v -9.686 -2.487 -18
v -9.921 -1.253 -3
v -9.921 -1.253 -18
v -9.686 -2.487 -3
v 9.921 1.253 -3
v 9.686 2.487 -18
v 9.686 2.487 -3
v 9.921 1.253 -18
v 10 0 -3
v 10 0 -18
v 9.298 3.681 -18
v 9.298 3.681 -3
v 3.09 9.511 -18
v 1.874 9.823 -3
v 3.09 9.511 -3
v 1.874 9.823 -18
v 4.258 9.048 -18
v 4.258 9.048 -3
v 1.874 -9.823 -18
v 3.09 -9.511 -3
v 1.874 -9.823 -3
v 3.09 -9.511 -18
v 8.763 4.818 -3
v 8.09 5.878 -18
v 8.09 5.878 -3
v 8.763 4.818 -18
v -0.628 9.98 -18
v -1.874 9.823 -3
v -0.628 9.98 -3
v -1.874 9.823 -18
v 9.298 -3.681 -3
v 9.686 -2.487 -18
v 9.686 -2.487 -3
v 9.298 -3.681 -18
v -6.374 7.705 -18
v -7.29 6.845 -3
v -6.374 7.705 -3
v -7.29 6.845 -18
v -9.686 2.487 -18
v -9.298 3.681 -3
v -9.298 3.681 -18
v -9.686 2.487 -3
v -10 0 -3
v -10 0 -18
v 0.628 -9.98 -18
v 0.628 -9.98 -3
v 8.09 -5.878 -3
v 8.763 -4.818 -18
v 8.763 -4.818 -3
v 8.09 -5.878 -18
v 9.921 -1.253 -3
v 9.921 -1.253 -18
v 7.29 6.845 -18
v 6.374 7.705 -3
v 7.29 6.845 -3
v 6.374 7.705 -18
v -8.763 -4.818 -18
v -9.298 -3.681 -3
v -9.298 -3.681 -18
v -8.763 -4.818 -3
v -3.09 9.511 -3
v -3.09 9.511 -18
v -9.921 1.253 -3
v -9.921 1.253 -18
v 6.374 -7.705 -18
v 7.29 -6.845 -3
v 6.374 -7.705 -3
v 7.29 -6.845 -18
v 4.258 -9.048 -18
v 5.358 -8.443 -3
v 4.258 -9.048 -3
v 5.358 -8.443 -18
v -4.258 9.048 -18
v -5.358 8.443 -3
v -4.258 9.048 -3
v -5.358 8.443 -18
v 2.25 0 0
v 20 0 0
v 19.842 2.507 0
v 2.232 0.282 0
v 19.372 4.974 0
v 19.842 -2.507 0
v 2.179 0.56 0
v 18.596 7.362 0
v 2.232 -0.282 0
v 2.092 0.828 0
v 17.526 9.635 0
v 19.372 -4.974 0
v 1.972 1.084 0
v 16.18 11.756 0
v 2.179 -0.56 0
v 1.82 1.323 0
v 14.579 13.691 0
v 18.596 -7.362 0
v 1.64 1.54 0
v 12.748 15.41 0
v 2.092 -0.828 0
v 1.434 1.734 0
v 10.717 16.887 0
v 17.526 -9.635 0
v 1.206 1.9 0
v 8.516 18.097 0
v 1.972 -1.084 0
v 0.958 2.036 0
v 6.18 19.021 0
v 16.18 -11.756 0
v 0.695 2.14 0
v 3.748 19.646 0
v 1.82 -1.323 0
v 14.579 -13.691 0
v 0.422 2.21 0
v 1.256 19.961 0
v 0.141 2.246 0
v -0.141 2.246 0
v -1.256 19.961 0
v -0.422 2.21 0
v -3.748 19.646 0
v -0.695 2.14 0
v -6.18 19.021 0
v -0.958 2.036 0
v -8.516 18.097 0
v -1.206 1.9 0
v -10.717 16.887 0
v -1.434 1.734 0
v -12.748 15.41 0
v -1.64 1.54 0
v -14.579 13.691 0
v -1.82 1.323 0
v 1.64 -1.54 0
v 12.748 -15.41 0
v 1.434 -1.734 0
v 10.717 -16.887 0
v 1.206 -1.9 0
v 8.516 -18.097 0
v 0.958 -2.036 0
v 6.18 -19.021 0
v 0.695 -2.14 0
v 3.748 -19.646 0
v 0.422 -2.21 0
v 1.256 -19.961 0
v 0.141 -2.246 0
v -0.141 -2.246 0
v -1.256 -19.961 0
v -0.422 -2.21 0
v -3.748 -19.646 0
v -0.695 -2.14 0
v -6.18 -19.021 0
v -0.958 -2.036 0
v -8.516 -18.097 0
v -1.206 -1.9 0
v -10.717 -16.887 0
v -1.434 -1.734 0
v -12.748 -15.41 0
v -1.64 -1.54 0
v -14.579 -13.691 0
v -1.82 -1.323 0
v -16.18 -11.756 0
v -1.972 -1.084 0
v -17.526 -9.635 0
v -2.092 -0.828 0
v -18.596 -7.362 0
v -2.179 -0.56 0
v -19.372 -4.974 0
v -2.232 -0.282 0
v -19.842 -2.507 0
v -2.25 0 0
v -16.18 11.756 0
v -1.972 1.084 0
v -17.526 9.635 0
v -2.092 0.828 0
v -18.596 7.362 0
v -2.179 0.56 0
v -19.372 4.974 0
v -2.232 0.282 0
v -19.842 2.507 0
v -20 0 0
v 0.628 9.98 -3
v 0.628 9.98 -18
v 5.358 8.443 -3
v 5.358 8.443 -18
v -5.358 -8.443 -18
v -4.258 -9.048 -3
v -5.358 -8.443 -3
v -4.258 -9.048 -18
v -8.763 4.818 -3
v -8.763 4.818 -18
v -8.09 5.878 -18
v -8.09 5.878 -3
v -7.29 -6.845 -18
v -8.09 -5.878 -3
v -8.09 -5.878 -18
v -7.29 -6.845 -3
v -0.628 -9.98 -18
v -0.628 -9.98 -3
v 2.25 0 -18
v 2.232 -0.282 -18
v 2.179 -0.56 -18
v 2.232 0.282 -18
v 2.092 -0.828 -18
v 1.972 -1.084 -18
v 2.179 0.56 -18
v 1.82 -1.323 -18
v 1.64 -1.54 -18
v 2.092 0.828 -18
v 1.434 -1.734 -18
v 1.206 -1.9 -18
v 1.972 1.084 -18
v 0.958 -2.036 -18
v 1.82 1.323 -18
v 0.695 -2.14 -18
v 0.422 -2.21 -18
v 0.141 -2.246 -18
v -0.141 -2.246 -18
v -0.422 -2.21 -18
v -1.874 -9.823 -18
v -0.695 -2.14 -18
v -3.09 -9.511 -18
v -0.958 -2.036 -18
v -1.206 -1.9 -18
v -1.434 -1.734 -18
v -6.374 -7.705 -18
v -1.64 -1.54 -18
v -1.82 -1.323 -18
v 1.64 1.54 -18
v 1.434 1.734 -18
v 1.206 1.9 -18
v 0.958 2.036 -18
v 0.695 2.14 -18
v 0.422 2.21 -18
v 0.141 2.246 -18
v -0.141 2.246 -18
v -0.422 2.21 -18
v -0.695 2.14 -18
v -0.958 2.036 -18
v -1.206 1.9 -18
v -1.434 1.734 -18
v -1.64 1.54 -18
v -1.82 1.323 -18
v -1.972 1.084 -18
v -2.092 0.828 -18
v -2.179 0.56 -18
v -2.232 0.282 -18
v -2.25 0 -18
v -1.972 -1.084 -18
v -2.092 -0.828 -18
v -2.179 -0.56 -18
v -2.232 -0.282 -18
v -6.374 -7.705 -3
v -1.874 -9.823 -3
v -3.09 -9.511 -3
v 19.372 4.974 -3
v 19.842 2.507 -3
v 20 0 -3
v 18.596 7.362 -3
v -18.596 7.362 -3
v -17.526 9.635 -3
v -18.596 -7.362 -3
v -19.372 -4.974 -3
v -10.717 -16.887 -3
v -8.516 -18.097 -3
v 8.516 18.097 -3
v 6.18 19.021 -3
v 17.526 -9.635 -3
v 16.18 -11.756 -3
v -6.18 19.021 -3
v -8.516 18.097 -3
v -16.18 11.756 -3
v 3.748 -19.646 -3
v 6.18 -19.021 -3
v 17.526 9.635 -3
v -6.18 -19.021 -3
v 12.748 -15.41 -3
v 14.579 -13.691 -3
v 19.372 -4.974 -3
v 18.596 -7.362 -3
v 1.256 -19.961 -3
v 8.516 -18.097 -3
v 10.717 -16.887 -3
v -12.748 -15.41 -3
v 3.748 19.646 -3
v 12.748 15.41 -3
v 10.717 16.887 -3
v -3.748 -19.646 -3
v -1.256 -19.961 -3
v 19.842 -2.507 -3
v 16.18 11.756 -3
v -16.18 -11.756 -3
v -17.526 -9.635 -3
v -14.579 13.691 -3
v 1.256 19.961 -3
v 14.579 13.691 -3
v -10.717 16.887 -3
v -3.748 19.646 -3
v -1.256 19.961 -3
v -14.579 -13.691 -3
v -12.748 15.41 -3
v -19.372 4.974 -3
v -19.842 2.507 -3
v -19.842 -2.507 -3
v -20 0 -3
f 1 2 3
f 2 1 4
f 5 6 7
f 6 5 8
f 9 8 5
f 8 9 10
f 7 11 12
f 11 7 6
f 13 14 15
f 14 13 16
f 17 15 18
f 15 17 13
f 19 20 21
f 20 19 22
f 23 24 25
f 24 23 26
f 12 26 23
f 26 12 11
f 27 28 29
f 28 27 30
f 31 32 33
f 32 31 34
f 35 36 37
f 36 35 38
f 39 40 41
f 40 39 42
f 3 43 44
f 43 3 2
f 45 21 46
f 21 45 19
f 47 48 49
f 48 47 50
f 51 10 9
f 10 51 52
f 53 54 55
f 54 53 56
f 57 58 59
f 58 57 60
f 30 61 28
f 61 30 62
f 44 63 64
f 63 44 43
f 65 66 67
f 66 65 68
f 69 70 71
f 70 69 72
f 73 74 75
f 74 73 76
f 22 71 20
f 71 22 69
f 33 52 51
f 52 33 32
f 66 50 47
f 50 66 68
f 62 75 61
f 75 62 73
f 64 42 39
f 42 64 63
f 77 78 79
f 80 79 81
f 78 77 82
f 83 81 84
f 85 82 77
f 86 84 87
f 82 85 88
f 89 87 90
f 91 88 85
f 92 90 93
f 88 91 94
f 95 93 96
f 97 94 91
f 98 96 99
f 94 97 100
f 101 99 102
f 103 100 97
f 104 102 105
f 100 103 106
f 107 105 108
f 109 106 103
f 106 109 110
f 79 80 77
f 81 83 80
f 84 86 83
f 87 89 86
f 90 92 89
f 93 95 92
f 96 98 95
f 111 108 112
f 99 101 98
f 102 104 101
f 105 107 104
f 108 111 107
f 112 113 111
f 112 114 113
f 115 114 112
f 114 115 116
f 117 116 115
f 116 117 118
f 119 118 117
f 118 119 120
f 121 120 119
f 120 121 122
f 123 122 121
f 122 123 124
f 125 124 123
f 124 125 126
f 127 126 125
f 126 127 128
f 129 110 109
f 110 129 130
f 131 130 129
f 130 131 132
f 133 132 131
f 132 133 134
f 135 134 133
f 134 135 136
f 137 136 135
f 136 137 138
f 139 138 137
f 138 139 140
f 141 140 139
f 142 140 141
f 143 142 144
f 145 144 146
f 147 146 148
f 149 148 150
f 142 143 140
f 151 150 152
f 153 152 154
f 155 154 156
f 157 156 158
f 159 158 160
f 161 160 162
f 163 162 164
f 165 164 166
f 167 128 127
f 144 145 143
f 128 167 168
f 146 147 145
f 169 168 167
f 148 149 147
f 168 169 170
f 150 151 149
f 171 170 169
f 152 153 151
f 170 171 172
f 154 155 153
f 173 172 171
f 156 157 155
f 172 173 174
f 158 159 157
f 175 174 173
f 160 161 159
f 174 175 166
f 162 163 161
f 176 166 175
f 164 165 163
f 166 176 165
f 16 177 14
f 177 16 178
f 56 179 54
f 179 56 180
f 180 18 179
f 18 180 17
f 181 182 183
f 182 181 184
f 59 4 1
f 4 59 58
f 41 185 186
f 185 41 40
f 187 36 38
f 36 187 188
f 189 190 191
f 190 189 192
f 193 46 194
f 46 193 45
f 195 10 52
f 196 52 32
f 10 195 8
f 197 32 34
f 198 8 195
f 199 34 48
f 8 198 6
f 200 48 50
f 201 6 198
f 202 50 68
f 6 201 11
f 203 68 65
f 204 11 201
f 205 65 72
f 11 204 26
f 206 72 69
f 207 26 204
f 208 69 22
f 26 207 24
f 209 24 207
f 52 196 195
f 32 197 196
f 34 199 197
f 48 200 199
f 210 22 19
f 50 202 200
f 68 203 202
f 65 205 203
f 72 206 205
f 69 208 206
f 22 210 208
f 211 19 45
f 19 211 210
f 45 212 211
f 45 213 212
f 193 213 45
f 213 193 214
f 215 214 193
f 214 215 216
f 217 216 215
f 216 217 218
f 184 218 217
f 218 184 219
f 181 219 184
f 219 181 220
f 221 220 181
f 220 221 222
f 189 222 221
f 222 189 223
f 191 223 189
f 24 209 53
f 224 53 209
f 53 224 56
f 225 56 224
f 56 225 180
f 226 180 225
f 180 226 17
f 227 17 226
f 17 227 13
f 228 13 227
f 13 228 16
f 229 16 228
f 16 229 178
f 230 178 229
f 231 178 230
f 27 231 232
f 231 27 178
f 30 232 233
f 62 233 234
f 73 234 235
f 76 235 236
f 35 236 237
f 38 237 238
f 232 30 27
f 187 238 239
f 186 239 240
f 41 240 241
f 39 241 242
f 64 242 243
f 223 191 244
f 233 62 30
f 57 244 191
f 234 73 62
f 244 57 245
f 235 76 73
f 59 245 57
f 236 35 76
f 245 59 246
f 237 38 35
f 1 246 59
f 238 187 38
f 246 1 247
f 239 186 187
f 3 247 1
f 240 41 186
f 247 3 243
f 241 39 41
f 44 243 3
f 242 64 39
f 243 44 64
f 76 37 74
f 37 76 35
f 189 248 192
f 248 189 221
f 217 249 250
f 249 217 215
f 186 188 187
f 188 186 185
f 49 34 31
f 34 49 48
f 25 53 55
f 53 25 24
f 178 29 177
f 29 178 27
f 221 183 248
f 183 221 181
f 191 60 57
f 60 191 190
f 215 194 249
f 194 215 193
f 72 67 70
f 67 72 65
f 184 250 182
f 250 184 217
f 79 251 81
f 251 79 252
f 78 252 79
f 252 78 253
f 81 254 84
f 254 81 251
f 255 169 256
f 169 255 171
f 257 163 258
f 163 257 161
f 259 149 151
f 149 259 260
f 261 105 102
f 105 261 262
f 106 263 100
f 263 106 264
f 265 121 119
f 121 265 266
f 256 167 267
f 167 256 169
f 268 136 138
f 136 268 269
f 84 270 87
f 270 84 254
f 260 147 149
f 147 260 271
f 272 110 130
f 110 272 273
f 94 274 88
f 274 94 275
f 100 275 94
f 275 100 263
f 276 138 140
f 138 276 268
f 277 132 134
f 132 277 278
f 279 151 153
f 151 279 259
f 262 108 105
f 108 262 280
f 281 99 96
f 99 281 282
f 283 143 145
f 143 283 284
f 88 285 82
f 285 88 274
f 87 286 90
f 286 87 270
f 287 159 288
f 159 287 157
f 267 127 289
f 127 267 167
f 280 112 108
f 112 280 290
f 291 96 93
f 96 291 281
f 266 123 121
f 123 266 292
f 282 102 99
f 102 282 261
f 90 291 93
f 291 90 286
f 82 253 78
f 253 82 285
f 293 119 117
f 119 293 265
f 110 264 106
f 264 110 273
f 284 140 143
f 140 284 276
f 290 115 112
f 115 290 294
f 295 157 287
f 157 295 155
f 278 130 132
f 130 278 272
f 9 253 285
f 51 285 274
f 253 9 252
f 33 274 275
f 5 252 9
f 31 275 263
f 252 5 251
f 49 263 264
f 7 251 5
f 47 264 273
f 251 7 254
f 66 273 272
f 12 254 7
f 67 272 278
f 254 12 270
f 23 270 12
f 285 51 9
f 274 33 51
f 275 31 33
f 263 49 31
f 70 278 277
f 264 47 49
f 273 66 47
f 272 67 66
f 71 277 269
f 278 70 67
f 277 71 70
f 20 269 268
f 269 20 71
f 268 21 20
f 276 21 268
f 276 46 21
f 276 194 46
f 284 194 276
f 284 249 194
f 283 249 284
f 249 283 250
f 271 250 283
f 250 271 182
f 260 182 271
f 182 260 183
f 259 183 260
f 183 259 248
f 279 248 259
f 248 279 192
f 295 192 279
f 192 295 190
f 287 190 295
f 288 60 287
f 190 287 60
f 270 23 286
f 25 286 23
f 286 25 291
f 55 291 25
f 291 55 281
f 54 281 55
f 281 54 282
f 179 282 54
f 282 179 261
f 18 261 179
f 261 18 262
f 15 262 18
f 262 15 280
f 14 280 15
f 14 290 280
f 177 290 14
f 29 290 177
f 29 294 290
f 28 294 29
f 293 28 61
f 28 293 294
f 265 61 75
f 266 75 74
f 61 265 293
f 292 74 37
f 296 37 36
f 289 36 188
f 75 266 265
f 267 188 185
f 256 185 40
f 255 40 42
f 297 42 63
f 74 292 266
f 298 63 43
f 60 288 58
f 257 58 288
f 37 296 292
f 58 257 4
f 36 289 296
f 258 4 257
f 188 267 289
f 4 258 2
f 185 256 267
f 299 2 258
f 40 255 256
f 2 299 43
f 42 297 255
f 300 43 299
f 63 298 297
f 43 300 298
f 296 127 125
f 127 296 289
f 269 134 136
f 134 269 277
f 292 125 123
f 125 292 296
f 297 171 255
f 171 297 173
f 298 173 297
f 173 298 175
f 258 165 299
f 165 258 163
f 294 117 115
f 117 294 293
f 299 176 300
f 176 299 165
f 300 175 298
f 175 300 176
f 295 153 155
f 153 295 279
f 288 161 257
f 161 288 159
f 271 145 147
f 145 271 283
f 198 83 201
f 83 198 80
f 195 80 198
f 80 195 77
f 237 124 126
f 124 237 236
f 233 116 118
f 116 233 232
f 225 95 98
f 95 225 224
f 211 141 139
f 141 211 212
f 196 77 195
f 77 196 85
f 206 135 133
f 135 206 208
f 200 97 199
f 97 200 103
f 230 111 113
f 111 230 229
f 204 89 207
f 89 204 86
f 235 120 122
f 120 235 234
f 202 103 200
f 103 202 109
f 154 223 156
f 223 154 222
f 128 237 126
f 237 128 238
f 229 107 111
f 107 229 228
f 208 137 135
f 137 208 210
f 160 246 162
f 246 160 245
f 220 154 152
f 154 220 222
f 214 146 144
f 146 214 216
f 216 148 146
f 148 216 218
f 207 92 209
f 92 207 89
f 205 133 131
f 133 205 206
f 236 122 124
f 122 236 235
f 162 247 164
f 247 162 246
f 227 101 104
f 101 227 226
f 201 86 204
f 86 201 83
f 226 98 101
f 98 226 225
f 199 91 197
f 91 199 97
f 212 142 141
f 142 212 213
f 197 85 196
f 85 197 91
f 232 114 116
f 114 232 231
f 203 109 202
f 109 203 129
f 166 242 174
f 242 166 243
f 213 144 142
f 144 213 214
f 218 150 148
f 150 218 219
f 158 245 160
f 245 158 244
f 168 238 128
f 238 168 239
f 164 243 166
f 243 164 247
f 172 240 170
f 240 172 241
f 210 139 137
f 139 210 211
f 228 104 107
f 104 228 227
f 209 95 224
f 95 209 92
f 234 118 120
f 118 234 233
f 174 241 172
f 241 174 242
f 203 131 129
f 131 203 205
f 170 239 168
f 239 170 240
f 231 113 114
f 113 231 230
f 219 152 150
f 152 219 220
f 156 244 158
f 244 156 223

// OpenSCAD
$fn = 50;


difference() {
	union() {
		translate(v = [0, 0, -18.0000000000]) {
			cylinder(h = 18, r = 10.0000000000);
		}
		translate(v = [0, 0, -3.0000000000]) {
			cylinder(h = 3, r = 20.0000000000);
		}
	}
	union() {
		#translate(v = [0, 0, -18]) {
			cylinder(h = 18, r = 2.2500000000);
		}
	}
}
